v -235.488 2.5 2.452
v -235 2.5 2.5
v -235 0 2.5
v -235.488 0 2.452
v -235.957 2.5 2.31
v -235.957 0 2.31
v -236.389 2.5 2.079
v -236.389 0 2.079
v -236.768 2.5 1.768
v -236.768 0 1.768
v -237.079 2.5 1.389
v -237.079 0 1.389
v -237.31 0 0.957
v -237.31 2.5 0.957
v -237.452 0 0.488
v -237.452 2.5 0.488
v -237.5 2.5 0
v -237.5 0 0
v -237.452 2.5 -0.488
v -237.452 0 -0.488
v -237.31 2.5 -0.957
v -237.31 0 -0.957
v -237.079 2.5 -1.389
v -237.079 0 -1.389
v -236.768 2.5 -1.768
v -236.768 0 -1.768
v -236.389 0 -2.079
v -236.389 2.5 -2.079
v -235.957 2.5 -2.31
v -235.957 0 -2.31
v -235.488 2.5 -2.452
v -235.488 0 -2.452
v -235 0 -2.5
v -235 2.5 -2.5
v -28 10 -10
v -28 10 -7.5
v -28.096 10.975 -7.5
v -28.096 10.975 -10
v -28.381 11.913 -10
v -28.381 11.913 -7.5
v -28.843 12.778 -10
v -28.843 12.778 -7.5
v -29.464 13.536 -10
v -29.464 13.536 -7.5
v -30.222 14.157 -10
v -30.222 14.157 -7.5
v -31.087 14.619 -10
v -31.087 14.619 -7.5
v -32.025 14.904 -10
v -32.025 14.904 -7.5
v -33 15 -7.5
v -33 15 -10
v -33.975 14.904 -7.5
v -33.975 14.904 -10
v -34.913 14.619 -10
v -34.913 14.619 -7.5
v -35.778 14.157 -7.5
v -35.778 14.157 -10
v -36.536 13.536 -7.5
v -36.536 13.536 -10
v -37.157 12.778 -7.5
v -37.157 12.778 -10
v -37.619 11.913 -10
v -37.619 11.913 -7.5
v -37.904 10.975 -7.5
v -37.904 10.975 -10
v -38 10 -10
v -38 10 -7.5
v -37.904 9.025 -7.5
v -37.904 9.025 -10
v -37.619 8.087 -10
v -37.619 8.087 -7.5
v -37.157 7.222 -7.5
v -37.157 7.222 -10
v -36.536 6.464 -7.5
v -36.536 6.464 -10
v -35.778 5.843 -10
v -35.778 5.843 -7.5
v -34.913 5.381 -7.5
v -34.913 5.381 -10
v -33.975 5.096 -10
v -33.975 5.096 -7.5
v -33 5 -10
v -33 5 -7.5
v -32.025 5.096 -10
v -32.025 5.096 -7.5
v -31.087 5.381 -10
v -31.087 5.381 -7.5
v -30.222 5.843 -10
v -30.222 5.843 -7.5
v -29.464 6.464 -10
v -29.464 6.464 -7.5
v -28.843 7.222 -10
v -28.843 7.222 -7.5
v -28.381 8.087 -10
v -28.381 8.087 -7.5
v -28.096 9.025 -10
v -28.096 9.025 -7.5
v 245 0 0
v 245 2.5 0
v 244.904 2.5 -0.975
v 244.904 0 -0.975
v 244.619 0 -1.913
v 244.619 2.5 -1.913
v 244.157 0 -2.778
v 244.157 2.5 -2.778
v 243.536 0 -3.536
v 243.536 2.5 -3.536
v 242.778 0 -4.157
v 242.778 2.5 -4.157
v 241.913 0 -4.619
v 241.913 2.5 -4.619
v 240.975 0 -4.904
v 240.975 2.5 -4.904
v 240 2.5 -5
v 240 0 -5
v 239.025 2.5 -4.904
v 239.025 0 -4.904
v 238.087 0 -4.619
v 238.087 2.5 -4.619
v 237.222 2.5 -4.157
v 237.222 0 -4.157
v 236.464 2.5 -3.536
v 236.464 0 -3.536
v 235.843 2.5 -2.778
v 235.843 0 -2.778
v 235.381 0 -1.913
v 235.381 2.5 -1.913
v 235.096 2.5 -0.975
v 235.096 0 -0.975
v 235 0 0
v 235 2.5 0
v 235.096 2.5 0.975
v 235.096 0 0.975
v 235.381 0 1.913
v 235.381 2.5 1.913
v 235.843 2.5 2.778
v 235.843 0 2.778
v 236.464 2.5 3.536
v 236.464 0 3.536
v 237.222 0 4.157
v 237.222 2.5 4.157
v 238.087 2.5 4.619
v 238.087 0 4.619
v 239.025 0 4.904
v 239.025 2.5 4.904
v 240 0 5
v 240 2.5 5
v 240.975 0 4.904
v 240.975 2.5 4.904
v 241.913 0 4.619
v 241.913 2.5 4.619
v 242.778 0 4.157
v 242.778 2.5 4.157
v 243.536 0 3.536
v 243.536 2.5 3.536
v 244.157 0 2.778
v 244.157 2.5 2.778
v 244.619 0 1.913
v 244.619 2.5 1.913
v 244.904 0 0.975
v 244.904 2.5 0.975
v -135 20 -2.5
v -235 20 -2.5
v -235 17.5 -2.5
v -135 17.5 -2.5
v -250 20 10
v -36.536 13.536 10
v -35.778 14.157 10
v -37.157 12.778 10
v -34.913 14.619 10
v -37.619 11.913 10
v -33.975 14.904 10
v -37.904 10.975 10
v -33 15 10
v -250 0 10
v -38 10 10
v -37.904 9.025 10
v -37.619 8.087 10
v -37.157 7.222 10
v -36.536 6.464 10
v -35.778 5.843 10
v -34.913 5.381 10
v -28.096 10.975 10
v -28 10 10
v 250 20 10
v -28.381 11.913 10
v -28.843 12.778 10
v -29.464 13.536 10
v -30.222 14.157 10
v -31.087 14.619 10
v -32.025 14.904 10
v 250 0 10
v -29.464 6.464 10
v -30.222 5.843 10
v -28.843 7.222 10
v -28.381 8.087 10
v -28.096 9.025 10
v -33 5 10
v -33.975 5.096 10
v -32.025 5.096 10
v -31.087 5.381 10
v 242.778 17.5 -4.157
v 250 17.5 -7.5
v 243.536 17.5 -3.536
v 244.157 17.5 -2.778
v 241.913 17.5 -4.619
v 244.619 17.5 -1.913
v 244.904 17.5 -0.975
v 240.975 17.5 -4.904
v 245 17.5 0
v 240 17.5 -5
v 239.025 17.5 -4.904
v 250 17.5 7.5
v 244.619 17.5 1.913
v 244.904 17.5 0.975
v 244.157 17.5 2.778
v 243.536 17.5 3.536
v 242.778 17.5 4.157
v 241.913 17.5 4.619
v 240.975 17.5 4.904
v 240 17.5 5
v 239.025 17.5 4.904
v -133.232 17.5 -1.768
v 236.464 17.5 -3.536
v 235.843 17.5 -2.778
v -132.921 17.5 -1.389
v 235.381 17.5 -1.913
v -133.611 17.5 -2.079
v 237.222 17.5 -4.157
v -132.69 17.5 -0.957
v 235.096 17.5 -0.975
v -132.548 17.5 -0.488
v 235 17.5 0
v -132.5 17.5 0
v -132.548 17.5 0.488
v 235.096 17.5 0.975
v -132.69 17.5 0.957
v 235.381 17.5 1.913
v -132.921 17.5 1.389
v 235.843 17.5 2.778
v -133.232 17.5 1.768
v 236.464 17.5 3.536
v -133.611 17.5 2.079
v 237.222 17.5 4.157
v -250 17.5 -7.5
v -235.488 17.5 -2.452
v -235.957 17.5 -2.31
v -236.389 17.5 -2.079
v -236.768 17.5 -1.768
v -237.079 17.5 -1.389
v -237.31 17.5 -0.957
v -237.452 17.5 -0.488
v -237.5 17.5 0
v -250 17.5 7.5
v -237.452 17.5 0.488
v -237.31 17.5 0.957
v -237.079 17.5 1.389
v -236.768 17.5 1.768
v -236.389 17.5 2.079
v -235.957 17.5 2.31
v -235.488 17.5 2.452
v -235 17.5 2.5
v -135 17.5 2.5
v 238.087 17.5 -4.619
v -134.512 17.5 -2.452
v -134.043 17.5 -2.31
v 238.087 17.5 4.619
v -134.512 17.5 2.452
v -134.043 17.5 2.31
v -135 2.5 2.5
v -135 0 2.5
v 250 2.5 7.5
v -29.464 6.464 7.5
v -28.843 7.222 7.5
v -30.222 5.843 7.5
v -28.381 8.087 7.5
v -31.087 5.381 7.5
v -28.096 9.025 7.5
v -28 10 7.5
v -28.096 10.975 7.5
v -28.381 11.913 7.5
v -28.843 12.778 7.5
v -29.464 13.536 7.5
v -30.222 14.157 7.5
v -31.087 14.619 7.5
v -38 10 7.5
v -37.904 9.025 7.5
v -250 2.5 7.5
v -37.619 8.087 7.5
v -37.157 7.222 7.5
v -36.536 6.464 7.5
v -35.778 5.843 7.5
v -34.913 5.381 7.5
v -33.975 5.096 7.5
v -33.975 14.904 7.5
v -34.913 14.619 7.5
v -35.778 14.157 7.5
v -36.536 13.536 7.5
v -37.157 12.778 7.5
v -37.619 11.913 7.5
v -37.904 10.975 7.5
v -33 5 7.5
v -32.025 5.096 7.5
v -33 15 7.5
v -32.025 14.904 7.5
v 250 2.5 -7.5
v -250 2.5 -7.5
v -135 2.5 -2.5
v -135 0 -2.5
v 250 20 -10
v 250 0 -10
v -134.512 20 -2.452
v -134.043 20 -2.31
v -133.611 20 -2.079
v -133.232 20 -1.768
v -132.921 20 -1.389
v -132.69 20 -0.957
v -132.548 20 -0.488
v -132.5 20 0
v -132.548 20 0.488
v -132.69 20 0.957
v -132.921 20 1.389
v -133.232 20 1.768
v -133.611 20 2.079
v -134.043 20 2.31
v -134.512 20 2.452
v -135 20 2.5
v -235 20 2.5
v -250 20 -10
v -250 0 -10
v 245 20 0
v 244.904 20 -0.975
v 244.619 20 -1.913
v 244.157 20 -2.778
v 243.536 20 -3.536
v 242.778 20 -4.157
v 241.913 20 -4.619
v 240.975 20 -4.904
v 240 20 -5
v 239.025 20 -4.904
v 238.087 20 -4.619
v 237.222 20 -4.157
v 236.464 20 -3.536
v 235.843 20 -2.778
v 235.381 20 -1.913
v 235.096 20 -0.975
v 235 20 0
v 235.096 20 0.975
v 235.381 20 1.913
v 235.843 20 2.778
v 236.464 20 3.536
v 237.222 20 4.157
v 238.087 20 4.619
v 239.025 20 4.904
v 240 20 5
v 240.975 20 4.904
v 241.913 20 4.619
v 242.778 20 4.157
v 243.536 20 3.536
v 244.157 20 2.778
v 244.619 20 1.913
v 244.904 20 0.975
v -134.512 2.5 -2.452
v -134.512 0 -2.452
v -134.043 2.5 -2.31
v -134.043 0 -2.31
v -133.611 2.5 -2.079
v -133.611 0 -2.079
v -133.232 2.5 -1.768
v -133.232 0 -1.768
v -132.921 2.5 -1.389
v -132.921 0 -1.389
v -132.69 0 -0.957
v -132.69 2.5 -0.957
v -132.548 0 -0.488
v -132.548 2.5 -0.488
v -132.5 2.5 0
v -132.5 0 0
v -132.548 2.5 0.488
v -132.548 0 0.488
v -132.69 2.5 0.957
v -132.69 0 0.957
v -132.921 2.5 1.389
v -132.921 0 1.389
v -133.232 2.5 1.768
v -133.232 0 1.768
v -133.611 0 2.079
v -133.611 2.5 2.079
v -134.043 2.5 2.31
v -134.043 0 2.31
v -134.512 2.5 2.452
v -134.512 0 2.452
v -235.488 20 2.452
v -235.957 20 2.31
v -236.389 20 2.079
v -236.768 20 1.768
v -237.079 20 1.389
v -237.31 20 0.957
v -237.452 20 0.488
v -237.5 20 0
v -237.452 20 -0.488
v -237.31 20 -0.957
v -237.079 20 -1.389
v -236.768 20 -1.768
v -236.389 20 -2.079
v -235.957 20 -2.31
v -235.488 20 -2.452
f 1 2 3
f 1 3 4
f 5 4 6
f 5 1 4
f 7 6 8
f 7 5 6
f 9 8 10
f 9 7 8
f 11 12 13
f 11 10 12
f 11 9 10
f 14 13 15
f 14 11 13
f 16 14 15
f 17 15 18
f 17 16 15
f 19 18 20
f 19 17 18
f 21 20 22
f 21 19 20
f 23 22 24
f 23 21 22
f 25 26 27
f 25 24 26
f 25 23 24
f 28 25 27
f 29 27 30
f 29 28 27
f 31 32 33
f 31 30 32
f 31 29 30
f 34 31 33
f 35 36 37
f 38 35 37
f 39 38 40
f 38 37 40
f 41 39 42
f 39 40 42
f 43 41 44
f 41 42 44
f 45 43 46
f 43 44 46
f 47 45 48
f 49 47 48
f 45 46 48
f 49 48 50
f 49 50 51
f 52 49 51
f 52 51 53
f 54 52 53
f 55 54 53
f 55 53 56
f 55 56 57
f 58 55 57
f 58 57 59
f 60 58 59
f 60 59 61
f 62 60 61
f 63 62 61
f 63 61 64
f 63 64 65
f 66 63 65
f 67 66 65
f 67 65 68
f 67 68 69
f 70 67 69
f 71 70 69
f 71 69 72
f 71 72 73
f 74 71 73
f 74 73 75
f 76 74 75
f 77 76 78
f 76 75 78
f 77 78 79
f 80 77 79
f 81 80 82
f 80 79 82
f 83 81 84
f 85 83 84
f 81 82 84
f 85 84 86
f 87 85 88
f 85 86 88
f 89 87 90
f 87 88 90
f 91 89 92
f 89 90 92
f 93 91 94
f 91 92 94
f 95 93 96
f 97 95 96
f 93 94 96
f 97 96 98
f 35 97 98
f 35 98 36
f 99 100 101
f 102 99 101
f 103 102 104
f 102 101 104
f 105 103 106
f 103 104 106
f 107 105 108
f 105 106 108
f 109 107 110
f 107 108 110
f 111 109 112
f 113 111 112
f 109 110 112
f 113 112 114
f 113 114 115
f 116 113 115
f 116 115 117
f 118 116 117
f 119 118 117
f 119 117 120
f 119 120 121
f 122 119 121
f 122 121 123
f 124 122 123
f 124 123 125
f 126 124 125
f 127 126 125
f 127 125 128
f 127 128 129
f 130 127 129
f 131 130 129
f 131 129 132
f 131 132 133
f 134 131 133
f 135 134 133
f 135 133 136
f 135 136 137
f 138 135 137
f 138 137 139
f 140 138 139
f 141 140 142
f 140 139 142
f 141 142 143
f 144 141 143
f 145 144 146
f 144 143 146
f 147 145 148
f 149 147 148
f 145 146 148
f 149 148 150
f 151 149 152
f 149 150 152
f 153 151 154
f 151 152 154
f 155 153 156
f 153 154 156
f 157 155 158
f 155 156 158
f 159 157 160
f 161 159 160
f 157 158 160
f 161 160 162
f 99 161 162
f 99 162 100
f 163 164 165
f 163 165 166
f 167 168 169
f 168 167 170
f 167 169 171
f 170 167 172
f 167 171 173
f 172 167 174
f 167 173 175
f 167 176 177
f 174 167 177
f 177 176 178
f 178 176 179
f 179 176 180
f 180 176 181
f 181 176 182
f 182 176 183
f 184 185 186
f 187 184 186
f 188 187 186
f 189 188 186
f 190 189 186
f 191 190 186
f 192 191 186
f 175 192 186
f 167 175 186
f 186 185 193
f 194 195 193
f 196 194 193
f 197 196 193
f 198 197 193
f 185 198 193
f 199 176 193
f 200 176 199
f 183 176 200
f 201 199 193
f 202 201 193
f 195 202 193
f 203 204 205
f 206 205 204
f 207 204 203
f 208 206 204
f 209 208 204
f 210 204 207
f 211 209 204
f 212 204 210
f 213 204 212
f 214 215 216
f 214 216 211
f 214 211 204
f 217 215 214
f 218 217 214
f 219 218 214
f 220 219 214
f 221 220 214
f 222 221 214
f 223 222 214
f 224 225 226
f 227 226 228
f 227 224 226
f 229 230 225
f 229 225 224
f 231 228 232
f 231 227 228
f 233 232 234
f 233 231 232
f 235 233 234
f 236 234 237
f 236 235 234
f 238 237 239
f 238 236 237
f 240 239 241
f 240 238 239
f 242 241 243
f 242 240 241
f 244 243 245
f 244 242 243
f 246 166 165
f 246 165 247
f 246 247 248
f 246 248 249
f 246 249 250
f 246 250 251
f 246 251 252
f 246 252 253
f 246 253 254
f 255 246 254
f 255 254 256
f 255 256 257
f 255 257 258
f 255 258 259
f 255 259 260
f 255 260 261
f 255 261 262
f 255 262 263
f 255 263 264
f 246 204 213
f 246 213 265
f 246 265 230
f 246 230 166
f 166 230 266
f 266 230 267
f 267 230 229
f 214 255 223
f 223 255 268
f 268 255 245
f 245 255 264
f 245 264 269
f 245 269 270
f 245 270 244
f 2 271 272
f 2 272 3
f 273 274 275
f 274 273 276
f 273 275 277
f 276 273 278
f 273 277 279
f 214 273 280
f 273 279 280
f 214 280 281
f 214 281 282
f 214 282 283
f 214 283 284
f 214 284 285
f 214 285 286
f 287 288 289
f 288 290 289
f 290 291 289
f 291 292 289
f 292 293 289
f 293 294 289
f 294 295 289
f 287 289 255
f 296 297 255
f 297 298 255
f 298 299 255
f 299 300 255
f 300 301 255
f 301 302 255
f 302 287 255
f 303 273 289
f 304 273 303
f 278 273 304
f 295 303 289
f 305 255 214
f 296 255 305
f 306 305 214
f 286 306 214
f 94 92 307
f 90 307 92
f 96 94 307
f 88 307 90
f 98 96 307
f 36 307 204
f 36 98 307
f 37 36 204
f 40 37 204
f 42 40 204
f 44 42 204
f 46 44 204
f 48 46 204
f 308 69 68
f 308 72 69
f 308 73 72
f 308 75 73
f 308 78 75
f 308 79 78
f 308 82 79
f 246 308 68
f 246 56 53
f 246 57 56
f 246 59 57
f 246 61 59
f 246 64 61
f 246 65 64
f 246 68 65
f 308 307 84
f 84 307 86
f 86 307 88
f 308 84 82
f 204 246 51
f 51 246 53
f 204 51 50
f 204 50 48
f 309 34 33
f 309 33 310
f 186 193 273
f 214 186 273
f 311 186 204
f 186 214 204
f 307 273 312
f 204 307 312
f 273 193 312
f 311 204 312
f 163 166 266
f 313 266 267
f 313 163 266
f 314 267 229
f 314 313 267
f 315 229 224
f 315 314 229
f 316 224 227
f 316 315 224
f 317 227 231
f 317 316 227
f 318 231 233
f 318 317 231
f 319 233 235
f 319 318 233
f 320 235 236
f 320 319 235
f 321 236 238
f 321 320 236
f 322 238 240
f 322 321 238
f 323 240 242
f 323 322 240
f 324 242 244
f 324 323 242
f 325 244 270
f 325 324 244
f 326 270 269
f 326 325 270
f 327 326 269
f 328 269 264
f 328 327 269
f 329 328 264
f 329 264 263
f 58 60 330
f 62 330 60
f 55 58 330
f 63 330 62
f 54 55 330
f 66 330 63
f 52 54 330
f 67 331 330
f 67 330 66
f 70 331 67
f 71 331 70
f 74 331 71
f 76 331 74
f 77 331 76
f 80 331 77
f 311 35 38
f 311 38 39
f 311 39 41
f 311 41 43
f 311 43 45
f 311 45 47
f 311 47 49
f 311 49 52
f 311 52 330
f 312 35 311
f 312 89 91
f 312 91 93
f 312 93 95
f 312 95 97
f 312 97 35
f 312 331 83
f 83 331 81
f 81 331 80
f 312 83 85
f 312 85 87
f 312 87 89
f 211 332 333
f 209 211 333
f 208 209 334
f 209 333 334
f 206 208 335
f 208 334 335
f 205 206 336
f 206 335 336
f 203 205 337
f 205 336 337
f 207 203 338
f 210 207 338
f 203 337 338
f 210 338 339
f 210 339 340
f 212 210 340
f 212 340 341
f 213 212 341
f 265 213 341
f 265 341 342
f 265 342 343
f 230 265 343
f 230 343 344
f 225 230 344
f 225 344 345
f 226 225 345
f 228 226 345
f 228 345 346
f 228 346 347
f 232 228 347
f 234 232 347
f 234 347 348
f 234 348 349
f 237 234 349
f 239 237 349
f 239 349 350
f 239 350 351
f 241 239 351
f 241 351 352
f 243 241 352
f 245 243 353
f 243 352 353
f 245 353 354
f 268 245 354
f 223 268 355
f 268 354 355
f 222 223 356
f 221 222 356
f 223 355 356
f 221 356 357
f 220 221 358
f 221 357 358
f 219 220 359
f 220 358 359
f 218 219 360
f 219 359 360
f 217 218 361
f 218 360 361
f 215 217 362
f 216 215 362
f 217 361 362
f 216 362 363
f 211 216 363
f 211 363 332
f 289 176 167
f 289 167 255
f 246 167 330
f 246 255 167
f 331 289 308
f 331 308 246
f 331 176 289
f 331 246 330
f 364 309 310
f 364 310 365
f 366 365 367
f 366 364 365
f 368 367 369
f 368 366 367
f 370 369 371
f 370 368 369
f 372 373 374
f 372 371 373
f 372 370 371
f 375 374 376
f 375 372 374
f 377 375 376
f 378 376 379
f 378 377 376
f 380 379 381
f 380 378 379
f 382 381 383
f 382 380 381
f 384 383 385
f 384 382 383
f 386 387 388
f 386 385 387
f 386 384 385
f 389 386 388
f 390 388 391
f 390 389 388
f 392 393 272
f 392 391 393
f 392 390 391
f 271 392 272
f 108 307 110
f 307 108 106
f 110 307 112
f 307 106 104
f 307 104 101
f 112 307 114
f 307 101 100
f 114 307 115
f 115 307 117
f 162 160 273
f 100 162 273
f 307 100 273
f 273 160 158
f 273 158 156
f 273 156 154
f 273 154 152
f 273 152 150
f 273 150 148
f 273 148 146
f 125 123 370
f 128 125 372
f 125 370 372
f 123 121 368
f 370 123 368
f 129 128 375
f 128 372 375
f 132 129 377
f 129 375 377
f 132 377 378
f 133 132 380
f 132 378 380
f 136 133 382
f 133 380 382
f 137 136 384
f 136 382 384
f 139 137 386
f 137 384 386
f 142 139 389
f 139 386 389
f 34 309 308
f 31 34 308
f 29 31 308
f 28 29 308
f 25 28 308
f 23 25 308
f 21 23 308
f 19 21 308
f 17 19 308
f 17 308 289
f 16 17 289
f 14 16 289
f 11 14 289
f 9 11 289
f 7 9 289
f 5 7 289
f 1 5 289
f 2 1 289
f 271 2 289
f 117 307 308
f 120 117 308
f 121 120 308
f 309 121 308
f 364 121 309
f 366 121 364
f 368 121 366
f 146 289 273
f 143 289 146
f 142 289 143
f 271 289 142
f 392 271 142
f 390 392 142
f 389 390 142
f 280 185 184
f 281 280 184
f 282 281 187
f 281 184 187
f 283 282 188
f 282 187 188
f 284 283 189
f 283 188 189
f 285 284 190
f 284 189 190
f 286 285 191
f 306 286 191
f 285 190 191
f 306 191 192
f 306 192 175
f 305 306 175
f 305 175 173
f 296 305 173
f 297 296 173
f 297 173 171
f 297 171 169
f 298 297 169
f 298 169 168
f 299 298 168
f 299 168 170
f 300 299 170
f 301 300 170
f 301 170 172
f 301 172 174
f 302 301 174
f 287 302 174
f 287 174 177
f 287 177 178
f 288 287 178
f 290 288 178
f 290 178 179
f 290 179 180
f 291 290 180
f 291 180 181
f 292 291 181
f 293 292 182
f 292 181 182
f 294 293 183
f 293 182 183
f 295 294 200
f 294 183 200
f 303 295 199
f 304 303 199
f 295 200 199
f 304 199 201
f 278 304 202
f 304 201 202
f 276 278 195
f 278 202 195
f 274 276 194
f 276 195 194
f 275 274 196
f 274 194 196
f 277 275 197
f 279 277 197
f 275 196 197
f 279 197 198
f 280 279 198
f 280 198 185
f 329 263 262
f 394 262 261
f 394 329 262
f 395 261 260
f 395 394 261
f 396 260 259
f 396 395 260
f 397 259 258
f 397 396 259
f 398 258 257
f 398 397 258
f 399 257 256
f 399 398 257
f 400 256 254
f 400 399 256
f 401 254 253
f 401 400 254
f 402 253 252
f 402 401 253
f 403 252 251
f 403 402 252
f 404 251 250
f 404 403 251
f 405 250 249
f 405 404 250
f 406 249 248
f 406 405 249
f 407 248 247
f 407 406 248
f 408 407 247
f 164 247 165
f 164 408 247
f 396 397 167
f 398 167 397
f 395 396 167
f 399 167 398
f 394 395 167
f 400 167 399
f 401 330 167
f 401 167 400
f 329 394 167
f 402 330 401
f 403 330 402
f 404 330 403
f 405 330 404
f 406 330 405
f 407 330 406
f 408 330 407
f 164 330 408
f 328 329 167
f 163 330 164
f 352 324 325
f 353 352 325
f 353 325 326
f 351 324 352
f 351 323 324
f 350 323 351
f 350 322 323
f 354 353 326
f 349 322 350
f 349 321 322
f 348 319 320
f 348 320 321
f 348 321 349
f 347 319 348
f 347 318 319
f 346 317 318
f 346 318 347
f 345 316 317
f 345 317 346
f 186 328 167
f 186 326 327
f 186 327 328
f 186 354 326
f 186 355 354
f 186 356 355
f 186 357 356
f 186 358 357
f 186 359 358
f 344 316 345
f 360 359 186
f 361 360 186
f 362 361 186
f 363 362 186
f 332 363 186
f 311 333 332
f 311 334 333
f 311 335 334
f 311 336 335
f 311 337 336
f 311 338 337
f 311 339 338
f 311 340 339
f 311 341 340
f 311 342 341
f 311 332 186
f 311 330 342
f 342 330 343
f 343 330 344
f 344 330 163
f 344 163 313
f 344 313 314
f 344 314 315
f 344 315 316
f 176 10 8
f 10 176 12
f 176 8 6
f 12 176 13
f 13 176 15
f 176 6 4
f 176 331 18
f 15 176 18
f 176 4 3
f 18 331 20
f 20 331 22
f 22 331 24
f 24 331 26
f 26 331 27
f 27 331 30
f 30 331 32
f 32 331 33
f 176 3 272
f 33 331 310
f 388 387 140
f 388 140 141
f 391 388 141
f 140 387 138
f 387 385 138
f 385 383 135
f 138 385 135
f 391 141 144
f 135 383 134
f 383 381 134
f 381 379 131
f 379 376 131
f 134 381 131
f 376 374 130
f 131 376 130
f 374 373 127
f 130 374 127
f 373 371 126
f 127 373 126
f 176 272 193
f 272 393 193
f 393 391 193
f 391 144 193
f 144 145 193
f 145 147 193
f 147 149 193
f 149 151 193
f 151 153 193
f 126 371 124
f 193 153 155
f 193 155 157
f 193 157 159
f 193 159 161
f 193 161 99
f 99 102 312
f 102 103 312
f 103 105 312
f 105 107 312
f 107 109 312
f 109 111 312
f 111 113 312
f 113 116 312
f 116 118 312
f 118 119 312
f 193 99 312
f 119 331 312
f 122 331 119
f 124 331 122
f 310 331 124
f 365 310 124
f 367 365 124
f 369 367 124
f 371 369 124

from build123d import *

# Parameters (mm, degrees)
SKETCH1_W           = 500
SKETCH1_H           = 20
BOSS_EXTRUDE1_DEPTH = 20
SKETCH6_R           = 5
CUT_EXTRUDE5_DEPTH  = 21
SKETCH8_W           = 15
SKETCH8_H           = 15
CUT_EXTRUDE7_DEPTH  = 501
CUT_EXTRUDE8_DEPTH  = 100
SKETCH10_R          = 5
CUT_EXTRUDE9_DEPTH  = 21


with BuildPart() as part:
    # Sketch1 → Boss-Extrude1 (new body)
    with BuildSketch(Plane(origin=(0, 0, 0), x_dir=(1, 0, 0), z_dir=(0, 1, 0))):
        Rectangle(SKETCH1_W, SKETCH1_H)
    extrude(amount=BOSS_EXTRUDE1_DEPTH)

    # Sketch6 → Cut-Extrude5 (cut, through all)
    with BuildSketch(Plane.XY.offset(10)):
        with Locations((-33, 10)):
            Circle(SKETCH6_R)
    extrude(amount=-CUT_EXTRUDE5_DEPTH, mode=Mode.SUBTRACT)

    # Sketch8 → Cut-Extrude7 (cut, through all)
    with BuildSketch(Plane.ZY.offset(250)):
        with Locations((0, 10)):
            Rectangle(SKETCH8_W, SKETCH8_H)
    extrude(amount=-CUT_EXTRUDE7_DEPTH, mode=Mode.SUBTRACT)

    # Sketch9 → Cut-Extrude8 (cut)
    with BuildSketch(Plane(origin=(0, 20, 0), x_dir=(1, 0, 0), z_dir=(0, 1, 0))):
        with BuildLine():
            Line((-235, 2.5), (-135, 2.5))
            ThreePointArc((-135, 2.5), (-132.5, 0), (-135, -2.5))
            Line((-135, -2.5), (-235, -2.5))
            ThreePointArc((-235, -2.5), (-237.5, 0), (-235, 2.5))
        make_face()
    extrude(amount=-CUT_EXTRUDE8_DEPTH, mode=Mode.SUBTRACT)

    # Sketch10 → Cut-Extrude9 (cut, through all)
    with BuildSketch(Plane(origin=(0, 20, 0), x_dir=(1, 0, 0), z_dir=(0, 1, 0))):
        with Locations((240, 0)):
            Circle(SKETCH10_R)
    extrude(amount=-CUT_EXTRUDE9_DEPTH, mode=Mode.SUBTRACT)


solid = part.part
